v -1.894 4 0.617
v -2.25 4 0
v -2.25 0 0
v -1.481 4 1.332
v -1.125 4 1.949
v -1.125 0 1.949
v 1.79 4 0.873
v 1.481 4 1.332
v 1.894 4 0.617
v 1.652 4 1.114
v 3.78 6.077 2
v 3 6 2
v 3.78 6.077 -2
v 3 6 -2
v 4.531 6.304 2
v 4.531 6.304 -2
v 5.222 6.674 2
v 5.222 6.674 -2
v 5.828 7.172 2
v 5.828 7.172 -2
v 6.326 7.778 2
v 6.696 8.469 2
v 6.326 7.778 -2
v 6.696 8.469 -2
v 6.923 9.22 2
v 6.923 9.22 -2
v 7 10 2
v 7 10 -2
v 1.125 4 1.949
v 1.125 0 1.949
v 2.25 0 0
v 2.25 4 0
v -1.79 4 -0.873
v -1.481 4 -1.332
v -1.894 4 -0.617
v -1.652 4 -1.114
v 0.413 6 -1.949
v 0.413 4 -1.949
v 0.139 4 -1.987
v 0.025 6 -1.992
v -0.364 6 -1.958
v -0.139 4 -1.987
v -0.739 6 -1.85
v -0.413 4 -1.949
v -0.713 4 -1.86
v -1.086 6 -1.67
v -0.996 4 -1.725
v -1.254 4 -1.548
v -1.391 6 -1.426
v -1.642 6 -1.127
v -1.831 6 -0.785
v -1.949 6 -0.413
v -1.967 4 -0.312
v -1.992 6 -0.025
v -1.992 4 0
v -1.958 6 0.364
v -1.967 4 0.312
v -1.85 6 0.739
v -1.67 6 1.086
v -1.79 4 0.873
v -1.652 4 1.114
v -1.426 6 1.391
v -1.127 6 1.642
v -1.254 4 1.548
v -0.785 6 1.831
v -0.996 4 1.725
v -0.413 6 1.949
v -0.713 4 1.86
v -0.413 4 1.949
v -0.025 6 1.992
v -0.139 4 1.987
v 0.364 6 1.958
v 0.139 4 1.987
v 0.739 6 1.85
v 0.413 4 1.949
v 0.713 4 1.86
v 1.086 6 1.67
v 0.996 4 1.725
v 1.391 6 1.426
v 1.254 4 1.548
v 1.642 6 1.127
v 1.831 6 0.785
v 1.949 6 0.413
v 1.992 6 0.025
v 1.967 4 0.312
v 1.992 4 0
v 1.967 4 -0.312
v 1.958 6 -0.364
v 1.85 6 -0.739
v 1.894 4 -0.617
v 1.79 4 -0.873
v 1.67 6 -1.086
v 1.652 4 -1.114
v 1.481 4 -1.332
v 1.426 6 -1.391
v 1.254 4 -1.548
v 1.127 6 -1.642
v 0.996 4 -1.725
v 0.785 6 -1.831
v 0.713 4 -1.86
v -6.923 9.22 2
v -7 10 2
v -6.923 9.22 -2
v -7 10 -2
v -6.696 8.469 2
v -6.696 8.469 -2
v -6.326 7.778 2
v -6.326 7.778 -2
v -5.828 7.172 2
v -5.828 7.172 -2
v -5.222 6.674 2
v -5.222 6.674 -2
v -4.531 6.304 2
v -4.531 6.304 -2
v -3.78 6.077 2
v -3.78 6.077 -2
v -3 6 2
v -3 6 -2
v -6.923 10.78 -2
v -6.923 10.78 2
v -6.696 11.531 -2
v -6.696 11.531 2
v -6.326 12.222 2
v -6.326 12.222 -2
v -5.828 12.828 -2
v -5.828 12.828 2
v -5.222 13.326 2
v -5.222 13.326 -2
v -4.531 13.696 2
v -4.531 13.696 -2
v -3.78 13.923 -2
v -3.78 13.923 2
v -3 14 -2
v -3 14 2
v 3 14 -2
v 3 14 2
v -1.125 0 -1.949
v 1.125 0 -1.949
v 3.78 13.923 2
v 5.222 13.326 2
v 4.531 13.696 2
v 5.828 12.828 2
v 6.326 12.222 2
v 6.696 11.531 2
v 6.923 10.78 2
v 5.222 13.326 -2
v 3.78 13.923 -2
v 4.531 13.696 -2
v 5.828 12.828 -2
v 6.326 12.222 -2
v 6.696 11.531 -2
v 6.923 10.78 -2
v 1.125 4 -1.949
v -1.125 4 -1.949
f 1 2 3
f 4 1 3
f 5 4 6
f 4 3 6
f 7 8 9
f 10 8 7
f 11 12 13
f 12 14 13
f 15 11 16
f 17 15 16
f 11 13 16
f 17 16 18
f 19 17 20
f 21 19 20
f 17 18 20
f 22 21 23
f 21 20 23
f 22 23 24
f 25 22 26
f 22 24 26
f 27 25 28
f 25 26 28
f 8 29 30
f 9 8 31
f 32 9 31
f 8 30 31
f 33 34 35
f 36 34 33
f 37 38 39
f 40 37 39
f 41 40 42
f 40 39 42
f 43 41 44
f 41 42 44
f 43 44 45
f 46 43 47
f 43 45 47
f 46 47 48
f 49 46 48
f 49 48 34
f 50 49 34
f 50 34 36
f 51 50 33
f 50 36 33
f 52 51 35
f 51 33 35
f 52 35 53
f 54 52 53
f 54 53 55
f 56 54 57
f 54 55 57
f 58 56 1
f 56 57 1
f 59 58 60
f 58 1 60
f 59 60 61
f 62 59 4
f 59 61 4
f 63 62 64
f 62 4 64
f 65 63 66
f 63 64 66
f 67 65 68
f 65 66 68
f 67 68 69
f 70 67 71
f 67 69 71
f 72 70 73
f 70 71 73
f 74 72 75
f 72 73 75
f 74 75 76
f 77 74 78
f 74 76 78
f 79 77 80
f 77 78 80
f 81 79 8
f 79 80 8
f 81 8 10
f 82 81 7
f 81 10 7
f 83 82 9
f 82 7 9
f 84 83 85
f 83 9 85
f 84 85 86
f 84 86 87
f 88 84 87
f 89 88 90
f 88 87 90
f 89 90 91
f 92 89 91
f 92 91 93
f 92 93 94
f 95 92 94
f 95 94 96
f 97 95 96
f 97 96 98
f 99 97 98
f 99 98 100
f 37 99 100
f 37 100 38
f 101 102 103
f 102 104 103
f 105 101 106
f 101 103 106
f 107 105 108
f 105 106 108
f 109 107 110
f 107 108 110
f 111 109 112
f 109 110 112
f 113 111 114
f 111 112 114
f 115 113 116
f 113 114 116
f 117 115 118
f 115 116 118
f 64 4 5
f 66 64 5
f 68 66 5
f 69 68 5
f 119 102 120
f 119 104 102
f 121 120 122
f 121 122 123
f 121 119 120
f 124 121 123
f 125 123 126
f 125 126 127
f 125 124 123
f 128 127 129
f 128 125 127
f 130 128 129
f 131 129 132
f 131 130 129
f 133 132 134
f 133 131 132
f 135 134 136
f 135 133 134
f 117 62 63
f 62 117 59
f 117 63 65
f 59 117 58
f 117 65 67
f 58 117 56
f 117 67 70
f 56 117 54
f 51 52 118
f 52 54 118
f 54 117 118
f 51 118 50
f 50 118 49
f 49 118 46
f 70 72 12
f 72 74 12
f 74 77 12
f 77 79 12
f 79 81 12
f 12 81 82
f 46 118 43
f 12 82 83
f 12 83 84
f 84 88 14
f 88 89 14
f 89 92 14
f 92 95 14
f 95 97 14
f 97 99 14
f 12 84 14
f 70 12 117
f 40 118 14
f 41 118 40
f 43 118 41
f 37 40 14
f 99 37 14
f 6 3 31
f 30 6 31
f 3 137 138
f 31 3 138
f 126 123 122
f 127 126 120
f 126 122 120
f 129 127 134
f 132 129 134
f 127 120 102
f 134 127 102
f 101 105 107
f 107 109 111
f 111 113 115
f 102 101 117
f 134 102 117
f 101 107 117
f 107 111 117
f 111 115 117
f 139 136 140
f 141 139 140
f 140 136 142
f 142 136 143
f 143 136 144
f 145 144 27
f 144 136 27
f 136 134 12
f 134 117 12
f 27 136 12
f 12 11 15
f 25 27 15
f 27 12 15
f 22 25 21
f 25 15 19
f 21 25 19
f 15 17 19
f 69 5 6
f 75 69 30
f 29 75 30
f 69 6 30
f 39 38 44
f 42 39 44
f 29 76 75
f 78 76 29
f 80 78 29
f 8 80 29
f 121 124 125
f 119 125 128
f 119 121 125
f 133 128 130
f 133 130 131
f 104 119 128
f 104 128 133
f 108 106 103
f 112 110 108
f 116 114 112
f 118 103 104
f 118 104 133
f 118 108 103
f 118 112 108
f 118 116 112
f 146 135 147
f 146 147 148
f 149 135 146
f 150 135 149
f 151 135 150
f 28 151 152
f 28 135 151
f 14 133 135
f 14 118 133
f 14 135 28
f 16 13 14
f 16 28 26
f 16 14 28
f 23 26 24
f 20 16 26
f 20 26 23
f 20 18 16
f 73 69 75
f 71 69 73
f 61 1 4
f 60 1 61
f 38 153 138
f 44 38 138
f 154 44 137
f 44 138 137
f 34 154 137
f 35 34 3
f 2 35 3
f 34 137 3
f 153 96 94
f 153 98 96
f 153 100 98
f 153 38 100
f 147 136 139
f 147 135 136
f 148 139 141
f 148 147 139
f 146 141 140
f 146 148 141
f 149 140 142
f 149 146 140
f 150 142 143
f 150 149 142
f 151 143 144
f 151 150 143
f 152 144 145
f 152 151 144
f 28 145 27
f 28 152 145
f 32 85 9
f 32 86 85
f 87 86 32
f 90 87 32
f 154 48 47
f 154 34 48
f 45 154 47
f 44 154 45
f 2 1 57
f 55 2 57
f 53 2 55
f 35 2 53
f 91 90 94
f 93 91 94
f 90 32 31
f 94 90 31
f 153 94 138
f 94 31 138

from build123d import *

# Parameters (mm, degrees)
BOSS_EXTRUDE1_DEPTH = 4
SKETCH3_R           = 1.991858429
BOSS_EXTRUDE3_DEPTH = 2
SKETCH2_W           = 14
SKETCH2_H           = 4
BOSS_EXTRUDE2_DEPTH = 8
FILLET1_R           = 4


with BuildPart() as part:
    # Sketch1 → Boss-Extrude1 (new body)
    with BuildSketch(Plane(origin=(0, 0, 0), x_dir=(1, 0, 0), z_dir=(0, 1, 0))):
        Polygon((1.125, 1.948557159), (-1.125, 1.948557159), (-2.25, 0), (-1.125, -1.948557159), (1.125, -1.948557159), (2.25, 0), align=None)
    extrude(amount=BOSS_EXTRUDE1_DEPTH)

    # Sketch3 → Boss-Extrude3 (add)
    with BuildSketch(Plane(origin=(0, 4, 0), x_dir=(1, 0, 0), z_dir=(0, 1, 0))):
        with Locations(Location((0, 0, 0), (0, 0, 78.031254445))):
            Circle(SKETCH3_R)
    extrude(amount=BOSS_EXTRUDE3_DEPTH)

    # Sketch2 → Boss-Extrude2 (add)
    with BuildSketch(Plane(origin=(0, 6, 0), x_dir=(1, 0, 0), z_dir=(0, 1, 0))):
        Rectangle(SKETCH2_W, SKETCH2_H)
    extrude(amount=BOSS_EXTRUDE2_DEPTH)

    # Fillet1
    fillet1_edges = [part.edges().sort_by_distance(p)[0] for p in [
        (7, 6, 0),
        (7, 14, 0),
        (-7, 6, 0),
        (-7, 14, 0),
    ]]
    fillet(fillet1_edges, radius=FILLET1_R - 0.0001)  # a hair under: the kernel refuses the full size


solid = part.part
